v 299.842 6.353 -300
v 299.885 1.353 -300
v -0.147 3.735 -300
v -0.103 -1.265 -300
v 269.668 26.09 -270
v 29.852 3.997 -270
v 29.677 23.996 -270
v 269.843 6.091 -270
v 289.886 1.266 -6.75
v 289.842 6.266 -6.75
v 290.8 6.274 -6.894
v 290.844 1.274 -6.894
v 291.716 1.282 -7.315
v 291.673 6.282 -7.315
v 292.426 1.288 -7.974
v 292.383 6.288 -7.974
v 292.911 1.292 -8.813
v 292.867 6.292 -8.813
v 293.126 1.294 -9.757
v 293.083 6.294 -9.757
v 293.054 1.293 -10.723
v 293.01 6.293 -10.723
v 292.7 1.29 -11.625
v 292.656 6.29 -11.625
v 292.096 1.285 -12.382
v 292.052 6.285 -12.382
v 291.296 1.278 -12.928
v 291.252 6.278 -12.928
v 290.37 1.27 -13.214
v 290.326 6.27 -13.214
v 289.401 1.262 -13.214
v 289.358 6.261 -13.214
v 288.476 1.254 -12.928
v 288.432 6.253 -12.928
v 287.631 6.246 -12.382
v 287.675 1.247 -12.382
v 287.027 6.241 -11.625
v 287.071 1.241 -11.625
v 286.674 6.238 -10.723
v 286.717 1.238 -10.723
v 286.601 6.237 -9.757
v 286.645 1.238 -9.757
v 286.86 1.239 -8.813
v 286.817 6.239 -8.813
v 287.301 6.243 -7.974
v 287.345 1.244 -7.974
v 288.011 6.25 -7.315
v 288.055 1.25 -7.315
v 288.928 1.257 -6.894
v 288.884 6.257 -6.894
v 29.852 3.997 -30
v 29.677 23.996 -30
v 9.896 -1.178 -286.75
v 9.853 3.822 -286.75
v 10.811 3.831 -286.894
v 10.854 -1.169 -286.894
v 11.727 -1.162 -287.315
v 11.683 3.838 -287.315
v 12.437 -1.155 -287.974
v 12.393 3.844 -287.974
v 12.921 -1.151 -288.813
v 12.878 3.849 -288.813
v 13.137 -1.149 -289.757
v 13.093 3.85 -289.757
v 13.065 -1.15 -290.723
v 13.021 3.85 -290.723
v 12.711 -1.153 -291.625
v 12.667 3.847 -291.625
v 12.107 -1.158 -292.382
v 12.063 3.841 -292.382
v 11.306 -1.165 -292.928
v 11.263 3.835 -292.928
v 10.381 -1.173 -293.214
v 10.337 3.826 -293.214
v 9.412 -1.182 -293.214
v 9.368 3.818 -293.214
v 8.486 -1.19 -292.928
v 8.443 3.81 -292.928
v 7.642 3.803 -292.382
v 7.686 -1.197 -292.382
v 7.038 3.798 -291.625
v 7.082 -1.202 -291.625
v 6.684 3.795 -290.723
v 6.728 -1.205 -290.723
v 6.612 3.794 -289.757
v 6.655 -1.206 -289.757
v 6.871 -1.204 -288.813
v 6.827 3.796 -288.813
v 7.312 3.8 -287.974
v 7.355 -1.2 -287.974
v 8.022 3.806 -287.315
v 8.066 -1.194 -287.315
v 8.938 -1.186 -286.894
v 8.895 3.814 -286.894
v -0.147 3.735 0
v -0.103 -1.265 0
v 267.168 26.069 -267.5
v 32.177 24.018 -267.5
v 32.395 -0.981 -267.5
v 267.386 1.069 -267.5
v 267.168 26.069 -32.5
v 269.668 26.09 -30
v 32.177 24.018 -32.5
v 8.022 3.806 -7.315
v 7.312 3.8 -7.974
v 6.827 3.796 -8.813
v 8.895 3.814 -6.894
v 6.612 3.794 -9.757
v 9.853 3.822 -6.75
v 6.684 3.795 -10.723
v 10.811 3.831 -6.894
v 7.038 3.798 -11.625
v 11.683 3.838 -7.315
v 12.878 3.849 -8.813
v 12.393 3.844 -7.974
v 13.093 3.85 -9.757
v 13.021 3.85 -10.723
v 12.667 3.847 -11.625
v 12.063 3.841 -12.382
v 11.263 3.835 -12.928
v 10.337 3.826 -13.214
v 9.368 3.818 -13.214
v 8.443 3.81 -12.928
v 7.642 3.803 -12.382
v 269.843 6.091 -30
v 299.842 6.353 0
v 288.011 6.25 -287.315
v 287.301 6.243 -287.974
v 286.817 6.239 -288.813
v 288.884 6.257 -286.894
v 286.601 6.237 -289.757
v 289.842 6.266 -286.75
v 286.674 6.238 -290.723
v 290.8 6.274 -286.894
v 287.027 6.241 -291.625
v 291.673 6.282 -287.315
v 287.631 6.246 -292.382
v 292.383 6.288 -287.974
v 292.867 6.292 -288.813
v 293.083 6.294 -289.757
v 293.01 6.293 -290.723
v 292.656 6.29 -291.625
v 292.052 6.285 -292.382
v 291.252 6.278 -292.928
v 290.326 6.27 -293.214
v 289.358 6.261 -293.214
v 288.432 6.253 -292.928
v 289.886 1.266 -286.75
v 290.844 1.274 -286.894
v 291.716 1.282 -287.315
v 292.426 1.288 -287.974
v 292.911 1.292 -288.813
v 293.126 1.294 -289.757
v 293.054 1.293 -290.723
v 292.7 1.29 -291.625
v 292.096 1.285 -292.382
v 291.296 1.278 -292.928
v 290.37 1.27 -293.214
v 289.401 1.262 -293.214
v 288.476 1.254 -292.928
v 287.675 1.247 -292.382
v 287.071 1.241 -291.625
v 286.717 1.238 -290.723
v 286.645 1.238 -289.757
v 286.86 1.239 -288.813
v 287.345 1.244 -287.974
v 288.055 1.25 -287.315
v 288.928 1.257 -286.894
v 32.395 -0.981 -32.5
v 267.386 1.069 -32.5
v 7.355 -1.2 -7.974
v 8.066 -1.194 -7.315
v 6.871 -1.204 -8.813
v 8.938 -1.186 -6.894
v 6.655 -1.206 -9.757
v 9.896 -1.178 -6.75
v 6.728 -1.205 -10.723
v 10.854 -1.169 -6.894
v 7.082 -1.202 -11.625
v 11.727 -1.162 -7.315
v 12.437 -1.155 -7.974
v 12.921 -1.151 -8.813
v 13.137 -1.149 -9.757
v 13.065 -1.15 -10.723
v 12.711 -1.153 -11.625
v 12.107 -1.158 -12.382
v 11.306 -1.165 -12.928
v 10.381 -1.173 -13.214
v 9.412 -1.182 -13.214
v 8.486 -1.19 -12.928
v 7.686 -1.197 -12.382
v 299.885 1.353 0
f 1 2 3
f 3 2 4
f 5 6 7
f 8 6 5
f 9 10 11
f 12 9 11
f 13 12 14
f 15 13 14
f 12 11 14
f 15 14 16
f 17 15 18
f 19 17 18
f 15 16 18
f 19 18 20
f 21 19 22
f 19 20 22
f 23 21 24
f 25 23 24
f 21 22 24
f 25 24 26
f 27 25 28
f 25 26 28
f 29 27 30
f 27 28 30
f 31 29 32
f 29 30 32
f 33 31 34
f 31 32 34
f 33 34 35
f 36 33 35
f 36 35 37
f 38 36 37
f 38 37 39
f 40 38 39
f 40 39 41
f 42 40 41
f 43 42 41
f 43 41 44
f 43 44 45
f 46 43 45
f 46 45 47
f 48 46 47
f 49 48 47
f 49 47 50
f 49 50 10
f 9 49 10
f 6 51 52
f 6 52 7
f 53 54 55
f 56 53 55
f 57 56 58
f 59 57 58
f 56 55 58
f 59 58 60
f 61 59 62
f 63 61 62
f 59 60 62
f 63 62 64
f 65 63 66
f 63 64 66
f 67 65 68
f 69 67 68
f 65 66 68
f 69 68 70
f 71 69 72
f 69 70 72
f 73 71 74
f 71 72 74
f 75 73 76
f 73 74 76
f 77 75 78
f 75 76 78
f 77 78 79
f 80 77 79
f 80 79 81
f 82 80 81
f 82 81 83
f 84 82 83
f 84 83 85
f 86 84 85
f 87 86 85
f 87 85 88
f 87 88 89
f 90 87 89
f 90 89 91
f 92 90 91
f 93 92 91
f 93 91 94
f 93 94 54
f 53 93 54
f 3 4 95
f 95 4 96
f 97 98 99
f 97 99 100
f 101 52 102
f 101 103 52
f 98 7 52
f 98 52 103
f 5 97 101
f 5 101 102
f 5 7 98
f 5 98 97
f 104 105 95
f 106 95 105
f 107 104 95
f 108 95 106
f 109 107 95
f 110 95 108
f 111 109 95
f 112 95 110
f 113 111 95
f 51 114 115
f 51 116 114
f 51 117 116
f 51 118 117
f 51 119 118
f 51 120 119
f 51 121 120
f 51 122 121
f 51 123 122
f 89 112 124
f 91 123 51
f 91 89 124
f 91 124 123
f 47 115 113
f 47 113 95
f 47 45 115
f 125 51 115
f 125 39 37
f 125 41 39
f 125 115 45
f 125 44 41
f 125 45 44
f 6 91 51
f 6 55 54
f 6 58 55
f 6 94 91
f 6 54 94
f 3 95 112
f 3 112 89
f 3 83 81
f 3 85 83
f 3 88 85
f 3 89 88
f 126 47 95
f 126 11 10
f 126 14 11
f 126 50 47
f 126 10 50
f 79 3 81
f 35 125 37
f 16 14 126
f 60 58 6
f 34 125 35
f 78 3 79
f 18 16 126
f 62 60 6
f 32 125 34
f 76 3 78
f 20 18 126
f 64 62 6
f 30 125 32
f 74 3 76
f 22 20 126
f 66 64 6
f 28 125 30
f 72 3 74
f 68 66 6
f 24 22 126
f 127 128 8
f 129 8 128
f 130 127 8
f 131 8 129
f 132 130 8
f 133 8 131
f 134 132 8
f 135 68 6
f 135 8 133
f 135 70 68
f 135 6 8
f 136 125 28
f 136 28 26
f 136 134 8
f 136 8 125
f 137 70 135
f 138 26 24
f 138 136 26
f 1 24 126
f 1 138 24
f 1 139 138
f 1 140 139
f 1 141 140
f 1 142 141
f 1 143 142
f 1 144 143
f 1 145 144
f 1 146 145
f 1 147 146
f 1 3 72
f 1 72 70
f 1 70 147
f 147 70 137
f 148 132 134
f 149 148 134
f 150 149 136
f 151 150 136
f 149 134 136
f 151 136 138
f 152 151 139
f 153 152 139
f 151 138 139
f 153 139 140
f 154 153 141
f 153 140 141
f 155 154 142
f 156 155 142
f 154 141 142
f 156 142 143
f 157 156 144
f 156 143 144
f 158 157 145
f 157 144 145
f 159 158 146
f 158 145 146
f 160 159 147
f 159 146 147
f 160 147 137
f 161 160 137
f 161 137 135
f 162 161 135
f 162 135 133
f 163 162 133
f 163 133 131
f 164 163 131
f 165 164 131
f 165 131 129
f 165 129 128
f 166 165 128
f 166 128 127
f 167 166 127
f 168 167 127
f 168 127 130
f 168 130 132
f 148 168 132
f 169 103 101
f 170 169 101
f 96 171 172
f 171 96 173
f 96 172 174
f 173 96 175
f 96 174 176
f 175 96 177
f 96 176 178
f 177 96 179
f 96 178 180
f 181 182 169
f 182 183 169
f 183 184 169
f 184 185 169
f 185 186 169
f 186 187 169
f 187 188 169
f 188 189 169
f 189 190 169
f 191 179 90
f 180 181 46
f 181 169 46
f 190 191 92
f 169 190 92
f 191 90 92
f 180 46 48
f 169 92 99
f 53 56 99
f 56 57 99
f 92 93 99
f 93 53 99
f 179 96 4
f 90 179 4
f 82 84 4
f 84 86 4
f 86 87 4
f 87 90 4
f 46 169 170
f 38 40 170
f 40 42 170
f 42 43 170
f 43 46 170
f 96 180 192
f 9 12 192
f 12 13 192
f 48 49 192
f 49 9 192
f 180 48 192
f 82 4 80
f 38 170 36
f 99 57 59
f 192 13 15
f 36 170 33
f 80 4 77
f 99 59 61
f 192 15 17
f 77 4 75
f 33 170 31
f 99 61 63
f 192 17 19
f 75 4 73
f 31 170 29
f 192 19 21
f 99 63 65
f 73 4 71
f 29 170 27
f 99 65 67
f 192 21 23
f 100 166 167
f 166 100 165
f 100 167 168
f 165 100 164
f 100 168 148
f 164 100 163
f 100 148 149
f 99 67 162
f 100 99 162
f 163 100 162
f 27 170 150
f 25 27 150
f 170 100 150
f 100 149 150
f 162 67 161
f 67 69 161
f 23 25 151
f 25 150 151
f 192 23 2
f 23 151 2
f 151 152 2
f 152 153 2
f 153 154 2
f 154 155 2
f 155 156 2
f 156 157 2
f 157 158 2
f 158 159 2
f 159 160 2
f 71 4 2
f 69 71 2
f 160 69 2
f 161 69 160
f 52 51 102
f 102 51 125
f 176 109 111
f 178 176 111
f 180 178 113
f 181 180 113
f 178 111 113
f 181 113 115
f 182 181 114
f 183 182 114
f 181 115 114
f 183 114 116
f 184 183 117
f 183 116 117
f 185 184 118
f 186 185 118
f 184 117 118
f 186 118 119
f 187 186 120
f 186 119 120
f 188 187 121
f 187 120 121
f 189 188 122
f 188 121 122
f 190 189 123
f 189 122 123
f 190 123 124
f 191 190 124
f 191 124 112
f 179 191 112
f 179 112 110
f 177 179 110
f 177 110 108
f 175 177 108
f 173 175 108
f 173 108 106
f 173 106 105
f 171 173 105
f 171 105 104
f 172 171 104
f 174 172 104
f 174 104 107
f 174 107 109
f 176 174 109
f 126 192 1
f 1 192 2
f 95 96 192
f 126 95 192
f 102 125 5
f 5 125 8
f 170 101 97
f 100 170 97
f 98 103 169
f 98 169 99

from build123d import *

# Parameters (mm, degrees)
BOSS_EXTRUDE1_DEPTH   = 5
SKETCH4_W             = 240
SKETCH4_H             = 240
SKETCH4_W_2           = 230.5
SKETCH4_H_2           = 230.5
BOSS_EXTRUDE2_DEPTH   = 20
SKETCH6_R             = 3.25
CUT_EXTRUDE1_DEPTH    = 20
SKETCH7_W             = 240
SKETCH7_H             = 240
CUT_EXTRUDE2_DEPTH    = 20
SKETCH8_W             = 240
SKETCH8_H             = 240
SKETCH8_W_2           = 235
SKETCH8_H_2           = 235
BOSS_EXTRUDE3_DEPTH   = 20
SKETCH9_W             = 235
SKETCH9_H             = 235
CUT_EXTRUDE3_DEPTH    = 20
BODY_MOVE_COPY1_ANGLE = 89.5
BODY_MOVE_COPY2_ANGLE = 90


with BuildPart() as part:
    # Sketch3 → Boss-Extrude1 (new body)
    with BuildSketch(Plane(origin=(0, 0, 0), x_dir=(1, 0, 0), z_dir=(0, 1, 0))):
        Polygon((300, 300), (150, 150), (300, 0), align=None)
        Polygon((150, 150), (0, 0), (300, 0), align=None)
        Polygon((0, 300), (0, 0), (150, 150), align=None)
        Polygon((0, 300), (150, 150), (300, 300), align=None)
    extrude(amount=BOSS_EXTRUDE1_DEPTH)

    # Sketch4 → Boss-Extrude2 (add)
    with BuildSketch(Plane(origin=(0, 5, 0), x_dir=(1, 0, 0), z_dir=(0, 1, 0))):
        with Locations((150, 150)):
            Rectangle(SKETCH4_W, SKETCH4_H)
        with Locations((150, 150)):
            Rectangle(SKETCH4_W_2, SKETCH4_H_2, mode=Mode.SUBTRACT)
    extrude(amount=BOSS_EXTRUDE2_DEPTH)

    # Sketch6 → Cut-Extrude1 (cut)
    with BuildSketch(Plane(origin=(0, 5, 0), x_dir=(1, 0, 0), z_dir=(0, 1, 0))):
        with Locations(Location((10, 10, 0), (0, 0, 270))):
            Circle(SKETCH6_R)
        with Locations(Location((290, 10, 0), (0, 0, 270))):
            Circle(SKETCH6_R)
        with Locations(Location((290, 290, 0), (0, 0, 270))):
            Circle(SKETCH6_R)
        with Locations(Location((10, 290, 0), (0, 0, 270))):
            Circle(SKETCH6_R)
    extrude(amount=-CUT_EXTRUDE1_DEPTH, mode=Mode.SUBTRACT)

    # Sketch7 → Cut-Extrude2 (cut)
    with BuildSketch(Plane(origin=(0, 25, 0), x_dir=(1, 0, 0), z_dir=(0, 1, 0))):
        with Locations((150, 150)):
            Rectangle(SKETCH7_W, SKETCH7_H)
    extrude(amount=-CUT_EXTRUDE2_DEPTH, mode=Mode.SUBTRACT)

    # Sketch8 → Boss-Extrude3 (add)
    with BuildSketch(Plane(origin=(0, 5, 0), x_dir=(1, 0, 0), z_dir=(0, 1, 0))):
        with Locations((150, 150)):
            Rectangle(SKETCH8_W, SKETCH8_H)
        with Locations((150, 150)):
            Rectangle(SKETCH8_W_2, SKETCH8_H_2, mode=Mode.SUBTRACT)
    extrude(amount=BOSS_EXTRUDE3_DEPTH)

    # Sketch9 → Cut-Extrude3 (cut)
    with BuildSketch(Plane(origin=(0, 5, 0), x_dir=(1, 0, 0), z_dir=(0, 1, 0))):
        with Locations((150, 150)):
            Rectangle(SKETCH9_W, SKETCH9_H)
    extrude(amount=-CUT_EXTRUDE3_DEPTH, mode=Mode.SUBTRACT)


with BuildPart() as part_1:
    # Body-Move/Copy1: moved
    add(part.part.rotate(Axis((150, 12.5, 0), (0, 0, -1)), BODY_MOVE_COPY1_ANGLE))


with BuildPart() as part_2:
    # Body-Move/Copy2: moved
    add(part_1.part.rotate(Axis((149.869101968, 12.412734645, 0), (0, 0, 1)), BODY_MOVE_COPY2_ANGLE))


solid = part_2.part
